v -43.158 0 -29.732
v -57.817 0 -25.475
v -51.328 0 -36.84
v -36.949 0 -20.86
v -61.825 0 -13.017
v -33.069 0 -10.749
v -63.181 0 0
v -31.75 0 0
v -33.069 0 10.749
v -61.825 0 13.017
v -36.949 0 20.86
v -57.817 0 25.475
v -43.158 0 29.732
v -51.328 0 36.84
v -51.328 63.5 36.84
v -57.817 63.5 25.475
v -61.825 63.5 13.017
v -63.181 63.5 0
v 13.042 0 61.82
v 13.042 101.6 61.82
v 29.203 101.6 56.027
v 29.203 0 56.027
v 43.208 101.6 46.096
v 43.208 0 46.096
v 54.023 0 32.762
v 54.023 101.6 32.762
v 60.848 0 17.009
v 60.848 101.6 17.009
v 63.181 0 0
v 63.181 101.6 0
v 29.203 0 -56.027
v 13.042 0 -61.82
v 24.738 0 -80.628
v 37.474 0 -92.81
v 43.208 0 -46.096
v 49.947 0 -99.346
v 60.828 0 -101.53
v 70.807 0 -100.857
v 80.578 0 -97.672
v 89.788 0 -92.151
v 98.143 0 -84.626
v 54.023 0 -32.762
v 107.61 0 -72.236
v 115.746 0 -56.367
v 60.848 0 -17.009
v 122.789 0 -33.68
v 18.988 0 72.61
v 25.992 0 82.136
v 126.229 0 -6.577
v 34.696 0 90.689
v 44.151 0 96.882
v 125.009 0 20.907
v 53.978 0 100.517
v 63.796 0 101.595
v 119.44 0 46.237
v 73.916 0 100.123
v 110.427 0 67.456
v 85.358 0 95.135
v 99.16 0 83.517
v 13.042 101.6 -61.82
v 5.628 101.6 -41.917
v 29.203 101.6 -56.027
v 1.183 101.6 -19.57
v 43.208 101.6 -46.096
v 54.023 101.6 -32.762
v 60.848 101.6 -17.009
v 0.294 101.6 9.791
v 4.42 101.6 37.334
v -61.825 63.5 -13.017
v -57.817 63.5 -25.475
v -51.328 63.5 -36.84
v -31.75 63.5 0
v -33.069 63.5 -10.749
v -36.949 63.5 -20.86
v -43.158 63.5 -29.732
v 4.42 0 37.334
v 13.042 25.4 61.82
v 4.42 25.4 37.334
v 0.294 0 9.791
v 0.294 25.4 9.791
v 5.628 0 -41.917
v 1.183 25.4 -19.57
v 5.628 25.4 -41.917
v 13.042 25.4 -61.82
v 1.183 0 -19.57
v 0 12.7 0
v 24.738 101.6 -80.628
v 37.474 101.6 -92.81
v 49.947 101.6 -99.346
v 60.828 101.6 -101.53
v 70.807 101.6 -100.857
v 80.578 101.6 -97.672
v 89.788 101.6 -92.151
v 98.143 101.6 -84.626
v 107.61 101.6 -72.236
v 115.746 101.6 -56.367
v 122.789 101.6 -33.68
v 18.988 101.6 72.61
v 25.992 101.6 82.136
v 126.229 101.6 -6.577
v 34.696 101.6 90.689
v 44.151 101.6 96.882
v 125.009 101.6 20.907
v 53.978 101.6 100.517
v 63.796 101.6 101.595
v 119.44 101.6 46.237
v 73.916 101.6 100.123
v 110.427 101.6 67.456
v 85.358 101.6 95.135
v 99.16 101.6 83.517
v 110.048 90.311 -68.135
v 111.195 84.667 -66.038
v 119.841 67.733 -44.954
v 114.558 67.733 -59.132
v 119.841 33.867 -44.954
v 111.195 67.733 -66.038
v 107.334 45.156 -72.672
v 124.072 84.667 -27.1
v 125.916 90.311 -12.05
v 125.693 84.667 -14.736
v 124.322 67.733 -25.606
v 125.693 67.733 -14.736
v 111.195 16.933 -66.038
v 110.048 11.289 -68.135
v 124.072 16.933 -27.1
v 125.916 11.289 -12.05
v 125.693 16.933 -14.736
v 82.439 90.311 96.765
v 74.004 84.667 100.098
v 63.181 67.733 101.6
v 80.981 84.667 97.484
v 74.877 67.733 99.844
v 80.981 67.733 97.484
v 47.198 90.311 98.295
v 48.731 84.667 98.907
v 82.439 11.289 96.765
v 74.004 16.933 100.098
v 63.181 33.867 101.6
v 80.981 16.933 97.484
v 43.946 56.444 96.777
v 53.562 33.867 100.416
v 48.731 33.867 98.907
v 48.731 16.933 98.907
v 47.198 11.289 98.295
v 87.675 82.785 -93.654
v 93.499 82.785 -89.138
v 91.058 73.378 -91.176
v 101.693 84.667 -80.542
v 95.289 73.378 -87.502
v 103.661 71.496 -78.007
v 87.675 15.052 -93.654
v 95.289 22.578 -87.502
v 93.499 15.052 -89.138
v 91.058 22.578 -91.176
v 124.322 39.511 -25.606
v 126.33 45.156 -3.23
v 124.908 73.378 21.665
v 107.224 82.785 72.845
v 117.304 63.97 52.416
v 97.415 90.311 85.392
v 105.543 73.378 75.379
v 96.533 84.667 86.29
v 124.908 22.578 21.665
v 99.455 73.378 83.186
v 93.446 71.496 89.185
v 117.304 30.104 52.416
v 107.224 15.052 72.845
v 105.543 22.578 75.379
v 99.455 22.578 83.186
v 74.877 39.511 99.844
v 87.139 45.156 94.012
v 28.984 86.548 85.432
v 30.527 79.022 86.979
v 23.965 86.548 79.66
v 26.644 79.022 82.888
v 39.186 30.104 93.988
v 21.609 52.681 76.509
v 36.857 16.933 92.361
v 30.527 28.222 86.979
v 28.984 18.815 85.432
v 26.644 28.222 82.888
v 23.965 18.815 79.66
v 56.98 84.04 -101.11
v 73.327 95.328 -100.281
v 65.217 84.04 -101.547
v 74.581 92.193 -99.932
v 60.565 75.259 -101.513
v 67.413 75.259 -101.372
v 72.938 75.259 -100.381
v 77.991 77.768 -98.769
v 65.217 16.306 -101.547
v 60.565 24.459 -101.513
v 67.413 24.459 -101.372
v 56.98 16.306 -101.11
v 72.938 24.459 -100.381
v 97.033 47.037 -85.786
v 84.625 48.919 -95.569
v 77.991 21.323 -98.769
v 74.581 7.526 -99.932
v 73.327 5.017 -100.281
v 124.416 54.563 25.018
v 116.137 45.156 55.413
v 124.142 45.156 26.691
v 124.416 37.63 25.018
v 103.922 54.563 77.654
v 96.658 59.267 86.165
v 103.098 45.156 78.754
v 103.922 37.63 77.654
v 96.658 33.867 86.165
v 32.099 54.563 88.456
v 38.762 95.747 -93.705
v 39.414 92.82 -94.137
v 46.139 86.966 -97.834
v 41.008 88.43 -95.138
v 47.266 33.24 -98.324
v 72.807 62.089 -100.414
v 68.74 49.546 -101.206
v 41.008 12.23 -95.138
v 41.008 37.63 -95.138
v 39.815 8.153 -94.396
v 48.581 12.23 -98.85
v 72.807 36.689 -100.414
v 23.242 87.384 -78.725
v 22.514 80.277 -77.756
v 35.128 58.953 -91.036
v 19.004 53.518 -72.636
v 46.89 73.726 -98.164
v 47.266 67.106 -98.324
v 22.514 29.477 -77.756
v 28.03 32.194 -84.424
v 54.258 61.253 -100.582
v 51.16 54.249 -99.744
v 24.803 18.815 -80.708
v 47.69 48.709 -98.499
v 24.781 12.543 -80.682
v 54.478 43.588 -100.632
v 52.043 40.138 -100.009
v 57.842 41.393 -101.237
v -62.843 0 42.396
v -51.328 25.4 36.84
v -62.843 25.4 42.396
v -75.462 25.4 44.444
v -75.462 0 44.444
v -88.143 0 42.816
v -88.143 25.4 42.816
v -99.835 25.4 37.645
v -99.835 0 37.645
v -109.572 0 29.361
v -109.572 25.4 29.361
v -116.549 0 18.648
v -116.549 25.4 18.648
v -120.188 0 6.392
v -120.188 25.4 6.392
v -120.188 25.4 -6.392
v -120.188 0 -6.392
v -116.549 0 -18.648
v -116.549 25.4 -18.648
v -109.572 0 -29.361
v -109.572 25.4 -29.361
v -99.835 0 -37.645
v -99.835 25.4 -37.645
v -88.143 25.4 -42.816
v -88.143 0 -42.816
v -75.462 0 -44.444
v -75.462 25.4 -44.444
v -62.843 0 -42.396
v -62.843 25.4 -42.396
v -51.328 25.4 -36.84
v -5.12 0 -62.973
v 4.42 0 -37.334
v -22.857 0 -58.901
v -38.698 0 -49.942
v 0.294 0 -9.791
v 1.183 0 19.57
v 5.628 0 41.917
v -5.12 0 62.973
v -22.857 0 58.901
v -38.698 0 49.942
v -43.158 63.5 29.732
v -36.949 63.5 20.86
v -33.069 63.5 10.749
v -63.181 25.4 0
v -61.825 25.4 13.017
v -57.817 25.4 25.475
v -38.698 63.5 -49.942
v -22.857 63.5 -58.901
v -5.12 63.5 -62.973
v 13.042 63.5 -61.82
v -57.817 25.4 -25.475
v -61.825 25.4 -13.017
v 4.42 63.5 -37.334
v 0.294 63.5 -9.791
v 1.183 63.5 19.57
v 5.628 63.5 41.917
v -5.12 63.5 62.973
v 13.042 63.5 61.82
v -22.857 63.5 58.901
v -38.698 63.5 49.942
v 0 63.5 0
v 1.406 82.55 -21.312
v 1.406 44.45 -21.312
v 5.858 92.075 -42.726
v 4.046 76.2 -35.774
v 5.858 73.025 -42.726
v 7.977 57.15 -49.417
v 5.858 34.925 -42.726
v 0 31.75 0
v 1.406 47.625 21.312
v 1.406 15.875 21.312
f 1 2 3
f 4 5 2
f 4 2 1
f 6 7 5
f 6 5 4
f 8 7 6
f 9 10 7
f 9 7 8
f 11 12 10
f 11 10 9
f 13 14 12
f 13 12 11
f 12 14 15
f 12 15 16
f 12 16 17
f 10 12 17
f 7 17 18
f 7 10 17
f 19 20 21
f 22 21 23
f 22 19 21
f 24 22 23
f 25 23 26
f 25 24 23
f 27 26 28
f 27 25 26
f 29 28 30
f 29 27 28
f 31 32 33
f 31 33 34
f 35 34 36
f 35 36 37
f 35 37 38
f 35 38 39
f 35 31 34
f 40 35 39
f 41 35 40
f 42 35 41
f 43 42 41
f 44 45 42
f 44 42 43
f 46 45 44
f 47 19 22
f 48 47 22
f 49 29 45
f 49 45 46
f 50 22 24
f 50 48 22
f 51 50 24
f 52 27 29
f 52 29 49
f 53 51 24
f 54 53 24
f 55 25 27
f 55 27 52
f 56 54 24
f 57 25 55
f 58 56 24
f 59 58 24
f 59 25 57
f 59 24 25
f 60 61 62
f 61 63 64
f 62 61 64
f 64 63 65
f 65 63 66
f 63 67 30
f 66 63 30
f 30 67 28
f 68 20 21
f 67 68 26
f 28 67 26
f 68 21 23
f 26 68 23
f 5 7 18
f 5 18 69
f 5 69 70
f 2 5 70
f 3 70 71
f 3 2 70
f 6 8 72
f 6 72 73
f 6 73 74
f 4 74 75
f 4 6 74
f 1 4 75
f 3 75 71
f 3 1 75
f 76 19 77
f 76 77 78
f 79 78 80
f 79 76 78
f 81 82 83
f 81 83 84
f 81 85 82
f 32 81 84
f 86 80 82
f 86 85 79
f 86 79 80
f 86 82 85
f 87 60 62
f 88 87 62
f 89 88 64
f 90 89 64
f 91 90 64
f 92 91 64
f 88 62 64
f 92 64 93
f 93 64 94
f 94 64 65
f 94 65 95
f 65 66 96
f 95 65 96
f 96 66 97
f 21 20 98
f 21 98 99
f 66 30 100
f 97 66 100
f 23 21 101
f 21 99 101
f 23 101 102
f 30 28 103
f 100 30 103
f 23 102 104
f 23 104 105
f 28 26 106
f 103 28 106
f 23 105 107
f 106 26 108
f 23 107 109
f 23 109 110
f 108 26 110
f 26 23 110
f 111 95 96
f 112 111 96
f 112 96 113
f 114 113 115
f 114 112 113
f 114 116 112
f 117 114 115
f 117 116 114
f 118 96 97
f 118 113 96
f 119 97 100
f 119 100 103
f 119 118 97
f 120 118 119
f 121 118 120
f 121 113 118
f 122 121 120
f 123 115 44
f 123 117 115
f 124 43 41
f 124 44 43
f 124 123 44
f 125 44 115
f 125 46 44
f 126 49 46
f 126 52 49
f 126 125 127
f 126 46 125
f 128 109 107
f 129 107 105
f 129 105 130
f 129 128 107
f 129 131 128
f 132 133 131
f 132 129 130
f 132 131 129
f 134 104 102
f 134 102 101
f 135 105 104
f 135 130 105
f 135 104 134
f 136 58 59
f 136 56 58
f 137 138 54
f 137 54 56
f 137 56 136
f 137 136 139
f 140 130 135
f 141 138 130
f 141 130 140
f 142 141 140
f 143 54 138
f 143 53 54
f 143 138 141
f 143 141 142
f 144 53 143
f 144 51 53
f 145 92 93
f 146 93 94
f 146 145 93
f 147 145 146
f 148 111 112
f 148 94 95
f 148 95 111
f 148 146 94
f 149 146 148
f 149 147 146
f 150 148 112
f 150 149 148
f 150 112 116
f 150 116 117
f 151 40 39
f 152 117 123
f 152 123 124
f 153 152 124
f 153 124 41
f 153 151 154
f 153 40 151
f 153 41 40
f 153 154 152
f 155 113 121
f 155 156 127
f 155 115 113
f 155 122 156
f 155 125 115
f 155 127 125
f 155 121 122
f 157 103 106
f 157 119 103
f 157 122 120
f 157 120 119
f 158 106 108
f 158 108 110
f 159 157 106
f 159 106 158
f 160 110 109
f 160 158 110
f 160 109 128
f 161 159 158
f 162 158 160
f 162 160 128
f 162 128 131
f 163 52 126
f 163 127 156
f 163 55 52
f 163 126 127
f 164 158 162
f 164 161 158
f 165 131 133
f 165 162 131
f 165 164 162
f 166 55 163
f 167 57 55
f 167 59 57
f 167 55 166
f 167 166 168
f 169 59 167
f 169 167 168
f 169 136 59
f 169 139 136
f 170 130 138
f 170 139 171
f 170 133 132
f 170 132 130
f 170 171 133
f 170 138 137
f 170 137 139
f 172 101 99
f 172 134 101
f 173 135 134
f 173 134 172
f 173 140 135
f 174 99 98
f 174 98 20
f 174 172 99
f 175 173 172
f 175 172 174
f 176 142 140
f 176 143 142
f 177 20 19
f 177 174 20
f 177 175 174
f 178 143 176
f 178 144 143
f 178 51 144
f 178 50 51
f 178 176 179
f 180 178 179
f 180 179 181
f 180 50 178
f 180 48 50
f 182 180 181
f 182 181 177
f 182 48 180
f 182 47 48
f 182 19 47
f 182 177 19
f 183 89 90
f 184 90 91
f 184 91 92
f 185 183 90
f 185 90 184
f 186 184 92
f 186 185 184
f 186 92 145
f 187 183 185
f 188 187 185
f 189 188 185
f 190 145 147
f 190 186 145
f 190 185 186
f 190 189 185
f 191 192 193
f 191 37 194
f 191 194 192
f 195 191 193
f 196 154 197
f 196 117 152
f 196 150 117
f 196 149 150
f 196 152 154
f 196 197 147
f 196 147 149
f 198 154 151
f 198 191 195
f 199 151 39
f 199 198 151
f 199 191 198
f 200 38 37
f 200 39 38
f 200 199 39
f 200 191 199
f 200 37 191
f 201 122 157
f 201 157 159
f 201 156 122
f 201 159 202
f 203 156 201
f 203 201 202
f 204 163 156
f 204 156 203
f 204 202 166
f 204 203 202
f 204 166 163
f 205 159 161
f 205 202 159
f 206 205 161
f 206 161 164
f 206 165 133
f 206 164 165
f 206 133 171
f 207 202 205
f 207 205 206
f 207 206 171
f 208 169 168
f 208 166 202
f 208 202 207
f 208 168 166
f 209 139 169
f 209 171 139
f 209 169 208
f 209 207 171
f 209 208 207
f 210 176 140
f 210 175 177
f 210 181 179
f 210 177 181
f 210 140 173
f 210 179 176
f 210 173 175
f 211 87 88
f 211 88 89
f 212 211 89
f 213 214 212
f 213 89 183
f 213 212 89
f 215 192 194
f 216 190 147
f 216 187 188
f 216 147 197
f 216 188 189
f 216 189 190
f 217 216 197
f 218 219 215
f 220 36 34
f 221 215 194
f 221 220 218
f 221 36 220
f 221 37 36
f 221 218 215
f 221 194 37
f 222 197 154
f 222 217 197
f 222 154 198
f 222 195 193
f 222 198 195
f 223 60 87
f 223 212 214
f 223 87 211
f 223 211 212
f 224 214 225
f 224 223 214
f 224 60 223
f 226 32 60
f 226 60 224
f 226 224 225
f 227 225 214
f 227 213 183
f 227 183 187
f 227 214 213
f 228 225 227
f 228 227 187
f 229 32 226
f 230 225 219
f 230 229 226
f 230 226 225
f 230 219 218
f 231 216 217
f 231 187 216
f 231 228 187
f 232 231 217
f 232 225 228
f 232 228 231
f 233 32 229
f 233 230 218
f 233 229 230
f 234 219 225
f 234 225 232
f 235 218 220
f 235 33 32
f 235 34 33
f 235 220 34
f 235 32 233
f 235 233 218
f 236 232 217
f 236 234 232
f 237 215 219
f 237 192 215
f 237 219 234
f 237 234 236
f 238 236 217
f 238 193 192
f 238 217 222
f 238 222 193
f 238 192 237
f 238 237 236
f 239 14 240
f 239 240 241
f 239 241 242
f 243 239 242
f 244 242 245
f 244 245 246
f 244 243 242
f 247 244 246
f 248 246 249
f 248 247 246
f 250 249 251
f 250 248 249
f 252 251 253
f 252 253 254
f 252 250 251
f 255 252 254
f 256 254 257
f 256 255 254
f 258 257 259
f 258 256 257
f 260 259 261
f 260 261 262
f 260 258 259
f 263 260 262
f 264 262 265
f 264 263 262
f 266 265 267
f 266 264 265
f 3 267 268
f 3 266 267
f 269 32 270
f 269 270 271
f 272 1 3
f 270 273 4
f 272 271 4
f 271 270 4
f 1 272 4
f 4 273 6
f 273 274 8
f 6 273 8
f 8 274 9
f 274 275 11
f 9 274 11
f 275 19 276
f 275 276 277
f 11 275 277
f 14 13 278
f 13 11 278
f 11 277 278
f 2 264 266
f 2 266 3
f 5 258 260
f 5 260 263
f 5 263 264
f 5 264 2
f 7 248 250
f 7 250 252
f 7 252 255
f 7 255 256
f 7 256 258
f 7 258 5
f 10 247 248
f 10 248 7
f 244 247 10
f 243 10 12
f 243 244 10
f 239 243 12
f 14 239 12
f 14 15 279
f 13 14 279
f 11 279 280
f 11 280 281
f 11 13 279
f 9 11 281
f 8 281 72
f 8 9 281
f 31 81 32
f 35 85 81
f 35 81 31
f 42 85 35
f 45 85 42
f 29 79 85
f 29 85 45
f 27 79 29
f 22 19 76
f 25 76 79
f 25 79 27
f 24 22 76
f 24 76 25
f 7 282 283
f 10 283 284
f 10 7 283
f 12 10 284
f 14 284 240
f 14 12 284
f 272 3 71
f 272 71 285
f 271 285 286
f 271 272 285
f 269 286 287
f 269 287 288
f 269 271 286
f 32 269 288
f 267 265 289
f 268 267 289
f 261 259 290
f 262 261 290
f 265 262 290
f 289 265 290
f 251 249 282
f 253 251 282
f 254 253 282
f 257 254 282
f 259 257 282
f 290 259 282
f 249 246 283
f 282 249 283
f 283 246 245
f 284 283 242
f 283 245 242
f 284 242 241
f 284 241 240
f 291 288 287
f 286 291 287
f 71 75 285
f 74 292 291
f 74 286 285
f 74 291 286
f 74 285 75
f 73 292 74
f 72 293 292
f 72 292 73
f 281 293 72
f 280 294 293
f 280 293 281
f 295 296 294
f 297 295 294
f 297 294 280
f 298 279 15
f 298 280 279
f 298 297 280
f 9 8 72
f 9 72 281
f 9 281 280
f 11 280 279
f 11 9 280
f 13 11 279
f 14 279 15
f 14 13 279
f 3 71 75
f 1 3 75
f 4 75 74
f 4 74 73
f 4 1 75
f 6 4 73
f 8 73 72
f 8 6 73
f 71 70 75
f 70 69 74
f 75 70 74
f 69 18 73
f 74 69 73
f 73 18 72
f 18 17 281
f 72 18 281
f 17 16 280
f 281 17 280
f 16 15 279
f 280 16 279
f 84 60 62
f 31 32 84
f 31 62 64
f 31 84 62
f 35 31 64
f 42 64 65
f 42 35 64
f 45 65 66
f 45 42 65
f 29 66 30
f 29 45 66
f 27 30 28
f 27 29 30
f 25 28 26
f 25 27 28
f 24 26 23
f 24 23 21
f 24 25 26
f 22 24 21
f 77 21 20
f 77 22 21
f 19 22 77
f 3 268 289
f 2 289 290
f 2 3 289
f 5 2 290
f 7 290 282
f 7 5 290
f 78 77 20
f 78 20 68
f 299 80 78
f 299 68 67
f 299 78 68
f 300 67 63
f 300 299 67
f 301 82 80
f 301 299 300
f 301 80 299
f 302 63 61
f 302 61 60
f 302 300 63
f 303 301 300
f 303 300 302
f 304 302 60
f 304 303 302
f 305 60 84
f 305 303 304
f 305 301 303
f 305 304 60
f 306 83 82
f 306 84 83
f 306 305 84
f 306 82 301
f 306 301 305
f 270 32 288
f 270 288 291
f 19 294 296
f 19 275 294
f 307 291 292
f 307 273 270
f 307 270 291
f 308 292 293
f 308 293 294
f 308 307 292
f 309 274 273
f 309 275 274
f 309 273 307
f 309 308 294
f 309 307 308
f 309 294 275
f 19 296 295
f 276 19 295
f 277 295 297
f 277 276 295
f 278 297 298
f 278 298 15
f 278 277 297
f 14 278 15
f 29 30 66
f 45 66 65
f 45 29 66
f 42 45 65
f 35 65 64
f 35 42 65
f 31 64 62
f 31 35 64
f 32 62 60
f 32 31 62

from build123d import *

# Parameters (mm, degrees)
F1_DEPTH = 63.5
F2_DEPTH = 101.6
F3_DEPTH = 25.4
F4_DEPTH = 63.5
F5_DEPTH = 101.6


# Not quite as in the source:
# - a feature names something its author has since deleted; it is built from what else it names


with BuildPart() as f1:
    # F0 (on Front) → F1 (new body)
    with BuildSketch(Plane.XZ):
        with BuildLine():
            add(Edge.make_bspline(
                [(0, 0), (0, -34.4673908513), (13.0417227804, -61.8200466708)],
                knots=[4.7123889804, 4.7123889804, 4.7123889804, 5.366513896, 5.366513896, 5.366513896], degree=2, weights=[1, 0.9469901505, 1]))
            Line((0, 0), (-31.75, 0))
            ThreePointArc((-31.75, 0), (-36.9485869215, -20.8597476336), (-51.3283609151, -36.8402506673))
            ThreePointArc((-51.3283609151, -36.8402506673), (-22.8574761732, -58.9011076844), (13.0417227804, -61.8200466708))
        make_face()
        with BuildLine():
            Line((-31.75, 0), (0, 0))
            add(Edge.make_bspline(
                [(13.0417227804, 61.8200466708), (0, 34.4673908513), (0, 0)],
                knots=[4.0582640648, 4.0582640648, 4.0582640648, 4.7123889804, 4.7123889804, 4.7123889804], degree=2, weights=[1, 0.9469901505, 1]))
            ThreePointArc((13.0417227804, 61.8200466708), (-22.8574761732, 58.9011076844), (-51.3283609151, 36.8402506673))
            ThreePointArc((-51.3283609151, 36.8402506673), (-36.9485869215, 20.8597476336), (-31.75, 0))
        make_face()
    extrude(amount=-F1_DEPTH)


with BuildPart() as f2:
    # F0 (on Front) → F2 (new body)
    with BuildSketch(Plane.XZ):
        with BuildLine():
            ThreePointArc((63.1807304759, 0), (49.0703081068, -39.7983613452), (13.0417227804, -61.8200466708))
            add(Edge.make_bspline(
                [(13.0417227804, -61.8200466708), (74.8763980172, -191.5070993665), (119.8405851231, -44.9535496832), (164.804772229, 101.6), (63.1807304759, 101.6)],
                knots=[5.366513896, 5.366513896, 5.366513896, 7.3956459284, 7.3956459284, 9.4247779608, 9.4247779608, 9.4247779608], degree=2, weights=[1, 0.5279885426, 1, 0.5279885426, 1]))
            Line((63.1807304759, 101.6), (63.1807304759, 0))
        make_face()
        with BuildLine():
            add(Edge.make_bspline(
                [(63.1807304759, 101.6), (32.00877033, 101.6), (13.0417227804, 61.8200466708)],
                knots=[3.1415926536, 3.1415926536, 3.1415926536, 4.0582640648, 4.0582640648, 4.0582640648], degree=2, weights=[1, 0.8967901166, 1]))
            ThreePointArc((13.0417227804, 61.8200466708), (49.0703081068, 39.7983613452), (63.1807304759, 0))
            Line((63.1807304759, 0), (63.1807304759, 101.6))
        make_face()
    extrude(amount=-F2_DEPTH)


with BuildPart() as f3:
    # F0 (on Front) → F3 (new body)
    with BuildSketch(Plane.XZ):
        with BuildLine():
            add(Edge.make_bspline(
                [(13.0417227804, 61.8200466708), (0, 34.4673908513), (0, 0)],
                knots=[4.0582640648, 4.0582640648, 4.0582640648, 4.7123889804, 4.7123889804, 4.7123889804], degree=2, weights=[1, 0.9469901505, 1]))
            add(Edge.make_bspline(
                [(0, 0), (0, -34.4673908513), (13.0417227804, -61.8200466708)],
                knots=[4.7123889804, 4.7123889804, 4.7123889804, 5.366513896, 5.366513896, 5.366513896], degree=2, weights=[1, 0.9469901505, 1]))
            ThreePointArc((13.0417227804, -61.8200466708), (49.0703081068, -39.7983613452), (63.1807304759, 0))
            ThreePointArc((63.1807304759, 0), (49.0703081068, 39.7983613452), (13.0417227804, 61.8200466708))
        make_face()
    extrude(amount=-F3_DEPTH)

    # F0 (on Front) → F5 (join)
    with BuildSketch(Plane.XZ):
        with BuildLine():
            add(Edge.make_bspline(
                [(13.0417227804, 61.8200466708), (0, 34.4673908513), (0, 0)],
                knots=[4.0582640648, 4.0582640648, 4.0582640648, 4.7123889804, 4.7123889804, 4.7123889804], degree=2, weights=[1, 0.9469901505, 1]))
            add(Edge.make_bspline(
                [(0, 0), (0, -34.4673908513), (13.0417227804, -61.8200466708)],
                knots=[4.7123889804, 4.7123889804, 4.7123889804, 5.366513896, 5.366513896, 5.366513896], degree=2, weights=[1, 0.9469901505, 1]))
            ThreePointArc((13.0417227804, -61.8200466708), (49.0703081068, -39.7983613452), (63.1807304759, 0))
            ThreePointArc((63.1807304759, 0), (49.0703081068, 39.7983613452), (13.0417227804, 61.8200466708))
        make_face()
    extrude(amount=-F5_DEPTH)


with BuildPart() as f3b:
    # F0 (on Front) → F3, piece 2 (new body)
    with BuildSketch(Plane.XZ):
        with BuildLine():
            ThreePointArc((-51.3283609151, -36.8402506673), (-60.1446923685, -19.3499530583), (-63.1807304759, 0))
            ThreePointArc((-63.1807304759, 0), (-60.1446923685, 19.3499530583), (-51.3283609151, 36.8402506673))
            ThreePointArc((-51.3283609151, 36.8402506673), (-120.65, 0), (-51.3283609151, -36.8402506673))
        make_face()
    extrude(amount=-F3_DEPTH)


with BuildPart() as f4:
    # F0 (on Front) → F4 (new body)
    with BuildSketch(Plane.XZ):
        with BuildLine():
            ThreePointArc((-51.3283609151, -36.8402506673), (-36.9485869215, -20.8597476336), (-31.75, 0))
            Line((-31.75, 0), (-63.1807304759, 0))
            ThreePointArc((-63.1807304759, 0), (-60.1446923685, -19.3499530583), (-51.3283609151, -36.8402506673))
        make_face()
        with BuildLine():
            Line((-63.1807304759, 0), (-31.75, 0))
            ThreePointArc((-31.75, 0), (-36.9485869215, 20.8597476336), (-51.3283609151, 36.8402506673))
            ThreePointArc((-51.3283609151, 36.8402506673), (-60.1446923685, 19.3499530583), (-63.1807304759, 0))
        make_face()
    extrude(amount=-F4_DEPTH)


solid = Compound([f1.part, f2.part, f3.part, f3b.part, f4.part])
